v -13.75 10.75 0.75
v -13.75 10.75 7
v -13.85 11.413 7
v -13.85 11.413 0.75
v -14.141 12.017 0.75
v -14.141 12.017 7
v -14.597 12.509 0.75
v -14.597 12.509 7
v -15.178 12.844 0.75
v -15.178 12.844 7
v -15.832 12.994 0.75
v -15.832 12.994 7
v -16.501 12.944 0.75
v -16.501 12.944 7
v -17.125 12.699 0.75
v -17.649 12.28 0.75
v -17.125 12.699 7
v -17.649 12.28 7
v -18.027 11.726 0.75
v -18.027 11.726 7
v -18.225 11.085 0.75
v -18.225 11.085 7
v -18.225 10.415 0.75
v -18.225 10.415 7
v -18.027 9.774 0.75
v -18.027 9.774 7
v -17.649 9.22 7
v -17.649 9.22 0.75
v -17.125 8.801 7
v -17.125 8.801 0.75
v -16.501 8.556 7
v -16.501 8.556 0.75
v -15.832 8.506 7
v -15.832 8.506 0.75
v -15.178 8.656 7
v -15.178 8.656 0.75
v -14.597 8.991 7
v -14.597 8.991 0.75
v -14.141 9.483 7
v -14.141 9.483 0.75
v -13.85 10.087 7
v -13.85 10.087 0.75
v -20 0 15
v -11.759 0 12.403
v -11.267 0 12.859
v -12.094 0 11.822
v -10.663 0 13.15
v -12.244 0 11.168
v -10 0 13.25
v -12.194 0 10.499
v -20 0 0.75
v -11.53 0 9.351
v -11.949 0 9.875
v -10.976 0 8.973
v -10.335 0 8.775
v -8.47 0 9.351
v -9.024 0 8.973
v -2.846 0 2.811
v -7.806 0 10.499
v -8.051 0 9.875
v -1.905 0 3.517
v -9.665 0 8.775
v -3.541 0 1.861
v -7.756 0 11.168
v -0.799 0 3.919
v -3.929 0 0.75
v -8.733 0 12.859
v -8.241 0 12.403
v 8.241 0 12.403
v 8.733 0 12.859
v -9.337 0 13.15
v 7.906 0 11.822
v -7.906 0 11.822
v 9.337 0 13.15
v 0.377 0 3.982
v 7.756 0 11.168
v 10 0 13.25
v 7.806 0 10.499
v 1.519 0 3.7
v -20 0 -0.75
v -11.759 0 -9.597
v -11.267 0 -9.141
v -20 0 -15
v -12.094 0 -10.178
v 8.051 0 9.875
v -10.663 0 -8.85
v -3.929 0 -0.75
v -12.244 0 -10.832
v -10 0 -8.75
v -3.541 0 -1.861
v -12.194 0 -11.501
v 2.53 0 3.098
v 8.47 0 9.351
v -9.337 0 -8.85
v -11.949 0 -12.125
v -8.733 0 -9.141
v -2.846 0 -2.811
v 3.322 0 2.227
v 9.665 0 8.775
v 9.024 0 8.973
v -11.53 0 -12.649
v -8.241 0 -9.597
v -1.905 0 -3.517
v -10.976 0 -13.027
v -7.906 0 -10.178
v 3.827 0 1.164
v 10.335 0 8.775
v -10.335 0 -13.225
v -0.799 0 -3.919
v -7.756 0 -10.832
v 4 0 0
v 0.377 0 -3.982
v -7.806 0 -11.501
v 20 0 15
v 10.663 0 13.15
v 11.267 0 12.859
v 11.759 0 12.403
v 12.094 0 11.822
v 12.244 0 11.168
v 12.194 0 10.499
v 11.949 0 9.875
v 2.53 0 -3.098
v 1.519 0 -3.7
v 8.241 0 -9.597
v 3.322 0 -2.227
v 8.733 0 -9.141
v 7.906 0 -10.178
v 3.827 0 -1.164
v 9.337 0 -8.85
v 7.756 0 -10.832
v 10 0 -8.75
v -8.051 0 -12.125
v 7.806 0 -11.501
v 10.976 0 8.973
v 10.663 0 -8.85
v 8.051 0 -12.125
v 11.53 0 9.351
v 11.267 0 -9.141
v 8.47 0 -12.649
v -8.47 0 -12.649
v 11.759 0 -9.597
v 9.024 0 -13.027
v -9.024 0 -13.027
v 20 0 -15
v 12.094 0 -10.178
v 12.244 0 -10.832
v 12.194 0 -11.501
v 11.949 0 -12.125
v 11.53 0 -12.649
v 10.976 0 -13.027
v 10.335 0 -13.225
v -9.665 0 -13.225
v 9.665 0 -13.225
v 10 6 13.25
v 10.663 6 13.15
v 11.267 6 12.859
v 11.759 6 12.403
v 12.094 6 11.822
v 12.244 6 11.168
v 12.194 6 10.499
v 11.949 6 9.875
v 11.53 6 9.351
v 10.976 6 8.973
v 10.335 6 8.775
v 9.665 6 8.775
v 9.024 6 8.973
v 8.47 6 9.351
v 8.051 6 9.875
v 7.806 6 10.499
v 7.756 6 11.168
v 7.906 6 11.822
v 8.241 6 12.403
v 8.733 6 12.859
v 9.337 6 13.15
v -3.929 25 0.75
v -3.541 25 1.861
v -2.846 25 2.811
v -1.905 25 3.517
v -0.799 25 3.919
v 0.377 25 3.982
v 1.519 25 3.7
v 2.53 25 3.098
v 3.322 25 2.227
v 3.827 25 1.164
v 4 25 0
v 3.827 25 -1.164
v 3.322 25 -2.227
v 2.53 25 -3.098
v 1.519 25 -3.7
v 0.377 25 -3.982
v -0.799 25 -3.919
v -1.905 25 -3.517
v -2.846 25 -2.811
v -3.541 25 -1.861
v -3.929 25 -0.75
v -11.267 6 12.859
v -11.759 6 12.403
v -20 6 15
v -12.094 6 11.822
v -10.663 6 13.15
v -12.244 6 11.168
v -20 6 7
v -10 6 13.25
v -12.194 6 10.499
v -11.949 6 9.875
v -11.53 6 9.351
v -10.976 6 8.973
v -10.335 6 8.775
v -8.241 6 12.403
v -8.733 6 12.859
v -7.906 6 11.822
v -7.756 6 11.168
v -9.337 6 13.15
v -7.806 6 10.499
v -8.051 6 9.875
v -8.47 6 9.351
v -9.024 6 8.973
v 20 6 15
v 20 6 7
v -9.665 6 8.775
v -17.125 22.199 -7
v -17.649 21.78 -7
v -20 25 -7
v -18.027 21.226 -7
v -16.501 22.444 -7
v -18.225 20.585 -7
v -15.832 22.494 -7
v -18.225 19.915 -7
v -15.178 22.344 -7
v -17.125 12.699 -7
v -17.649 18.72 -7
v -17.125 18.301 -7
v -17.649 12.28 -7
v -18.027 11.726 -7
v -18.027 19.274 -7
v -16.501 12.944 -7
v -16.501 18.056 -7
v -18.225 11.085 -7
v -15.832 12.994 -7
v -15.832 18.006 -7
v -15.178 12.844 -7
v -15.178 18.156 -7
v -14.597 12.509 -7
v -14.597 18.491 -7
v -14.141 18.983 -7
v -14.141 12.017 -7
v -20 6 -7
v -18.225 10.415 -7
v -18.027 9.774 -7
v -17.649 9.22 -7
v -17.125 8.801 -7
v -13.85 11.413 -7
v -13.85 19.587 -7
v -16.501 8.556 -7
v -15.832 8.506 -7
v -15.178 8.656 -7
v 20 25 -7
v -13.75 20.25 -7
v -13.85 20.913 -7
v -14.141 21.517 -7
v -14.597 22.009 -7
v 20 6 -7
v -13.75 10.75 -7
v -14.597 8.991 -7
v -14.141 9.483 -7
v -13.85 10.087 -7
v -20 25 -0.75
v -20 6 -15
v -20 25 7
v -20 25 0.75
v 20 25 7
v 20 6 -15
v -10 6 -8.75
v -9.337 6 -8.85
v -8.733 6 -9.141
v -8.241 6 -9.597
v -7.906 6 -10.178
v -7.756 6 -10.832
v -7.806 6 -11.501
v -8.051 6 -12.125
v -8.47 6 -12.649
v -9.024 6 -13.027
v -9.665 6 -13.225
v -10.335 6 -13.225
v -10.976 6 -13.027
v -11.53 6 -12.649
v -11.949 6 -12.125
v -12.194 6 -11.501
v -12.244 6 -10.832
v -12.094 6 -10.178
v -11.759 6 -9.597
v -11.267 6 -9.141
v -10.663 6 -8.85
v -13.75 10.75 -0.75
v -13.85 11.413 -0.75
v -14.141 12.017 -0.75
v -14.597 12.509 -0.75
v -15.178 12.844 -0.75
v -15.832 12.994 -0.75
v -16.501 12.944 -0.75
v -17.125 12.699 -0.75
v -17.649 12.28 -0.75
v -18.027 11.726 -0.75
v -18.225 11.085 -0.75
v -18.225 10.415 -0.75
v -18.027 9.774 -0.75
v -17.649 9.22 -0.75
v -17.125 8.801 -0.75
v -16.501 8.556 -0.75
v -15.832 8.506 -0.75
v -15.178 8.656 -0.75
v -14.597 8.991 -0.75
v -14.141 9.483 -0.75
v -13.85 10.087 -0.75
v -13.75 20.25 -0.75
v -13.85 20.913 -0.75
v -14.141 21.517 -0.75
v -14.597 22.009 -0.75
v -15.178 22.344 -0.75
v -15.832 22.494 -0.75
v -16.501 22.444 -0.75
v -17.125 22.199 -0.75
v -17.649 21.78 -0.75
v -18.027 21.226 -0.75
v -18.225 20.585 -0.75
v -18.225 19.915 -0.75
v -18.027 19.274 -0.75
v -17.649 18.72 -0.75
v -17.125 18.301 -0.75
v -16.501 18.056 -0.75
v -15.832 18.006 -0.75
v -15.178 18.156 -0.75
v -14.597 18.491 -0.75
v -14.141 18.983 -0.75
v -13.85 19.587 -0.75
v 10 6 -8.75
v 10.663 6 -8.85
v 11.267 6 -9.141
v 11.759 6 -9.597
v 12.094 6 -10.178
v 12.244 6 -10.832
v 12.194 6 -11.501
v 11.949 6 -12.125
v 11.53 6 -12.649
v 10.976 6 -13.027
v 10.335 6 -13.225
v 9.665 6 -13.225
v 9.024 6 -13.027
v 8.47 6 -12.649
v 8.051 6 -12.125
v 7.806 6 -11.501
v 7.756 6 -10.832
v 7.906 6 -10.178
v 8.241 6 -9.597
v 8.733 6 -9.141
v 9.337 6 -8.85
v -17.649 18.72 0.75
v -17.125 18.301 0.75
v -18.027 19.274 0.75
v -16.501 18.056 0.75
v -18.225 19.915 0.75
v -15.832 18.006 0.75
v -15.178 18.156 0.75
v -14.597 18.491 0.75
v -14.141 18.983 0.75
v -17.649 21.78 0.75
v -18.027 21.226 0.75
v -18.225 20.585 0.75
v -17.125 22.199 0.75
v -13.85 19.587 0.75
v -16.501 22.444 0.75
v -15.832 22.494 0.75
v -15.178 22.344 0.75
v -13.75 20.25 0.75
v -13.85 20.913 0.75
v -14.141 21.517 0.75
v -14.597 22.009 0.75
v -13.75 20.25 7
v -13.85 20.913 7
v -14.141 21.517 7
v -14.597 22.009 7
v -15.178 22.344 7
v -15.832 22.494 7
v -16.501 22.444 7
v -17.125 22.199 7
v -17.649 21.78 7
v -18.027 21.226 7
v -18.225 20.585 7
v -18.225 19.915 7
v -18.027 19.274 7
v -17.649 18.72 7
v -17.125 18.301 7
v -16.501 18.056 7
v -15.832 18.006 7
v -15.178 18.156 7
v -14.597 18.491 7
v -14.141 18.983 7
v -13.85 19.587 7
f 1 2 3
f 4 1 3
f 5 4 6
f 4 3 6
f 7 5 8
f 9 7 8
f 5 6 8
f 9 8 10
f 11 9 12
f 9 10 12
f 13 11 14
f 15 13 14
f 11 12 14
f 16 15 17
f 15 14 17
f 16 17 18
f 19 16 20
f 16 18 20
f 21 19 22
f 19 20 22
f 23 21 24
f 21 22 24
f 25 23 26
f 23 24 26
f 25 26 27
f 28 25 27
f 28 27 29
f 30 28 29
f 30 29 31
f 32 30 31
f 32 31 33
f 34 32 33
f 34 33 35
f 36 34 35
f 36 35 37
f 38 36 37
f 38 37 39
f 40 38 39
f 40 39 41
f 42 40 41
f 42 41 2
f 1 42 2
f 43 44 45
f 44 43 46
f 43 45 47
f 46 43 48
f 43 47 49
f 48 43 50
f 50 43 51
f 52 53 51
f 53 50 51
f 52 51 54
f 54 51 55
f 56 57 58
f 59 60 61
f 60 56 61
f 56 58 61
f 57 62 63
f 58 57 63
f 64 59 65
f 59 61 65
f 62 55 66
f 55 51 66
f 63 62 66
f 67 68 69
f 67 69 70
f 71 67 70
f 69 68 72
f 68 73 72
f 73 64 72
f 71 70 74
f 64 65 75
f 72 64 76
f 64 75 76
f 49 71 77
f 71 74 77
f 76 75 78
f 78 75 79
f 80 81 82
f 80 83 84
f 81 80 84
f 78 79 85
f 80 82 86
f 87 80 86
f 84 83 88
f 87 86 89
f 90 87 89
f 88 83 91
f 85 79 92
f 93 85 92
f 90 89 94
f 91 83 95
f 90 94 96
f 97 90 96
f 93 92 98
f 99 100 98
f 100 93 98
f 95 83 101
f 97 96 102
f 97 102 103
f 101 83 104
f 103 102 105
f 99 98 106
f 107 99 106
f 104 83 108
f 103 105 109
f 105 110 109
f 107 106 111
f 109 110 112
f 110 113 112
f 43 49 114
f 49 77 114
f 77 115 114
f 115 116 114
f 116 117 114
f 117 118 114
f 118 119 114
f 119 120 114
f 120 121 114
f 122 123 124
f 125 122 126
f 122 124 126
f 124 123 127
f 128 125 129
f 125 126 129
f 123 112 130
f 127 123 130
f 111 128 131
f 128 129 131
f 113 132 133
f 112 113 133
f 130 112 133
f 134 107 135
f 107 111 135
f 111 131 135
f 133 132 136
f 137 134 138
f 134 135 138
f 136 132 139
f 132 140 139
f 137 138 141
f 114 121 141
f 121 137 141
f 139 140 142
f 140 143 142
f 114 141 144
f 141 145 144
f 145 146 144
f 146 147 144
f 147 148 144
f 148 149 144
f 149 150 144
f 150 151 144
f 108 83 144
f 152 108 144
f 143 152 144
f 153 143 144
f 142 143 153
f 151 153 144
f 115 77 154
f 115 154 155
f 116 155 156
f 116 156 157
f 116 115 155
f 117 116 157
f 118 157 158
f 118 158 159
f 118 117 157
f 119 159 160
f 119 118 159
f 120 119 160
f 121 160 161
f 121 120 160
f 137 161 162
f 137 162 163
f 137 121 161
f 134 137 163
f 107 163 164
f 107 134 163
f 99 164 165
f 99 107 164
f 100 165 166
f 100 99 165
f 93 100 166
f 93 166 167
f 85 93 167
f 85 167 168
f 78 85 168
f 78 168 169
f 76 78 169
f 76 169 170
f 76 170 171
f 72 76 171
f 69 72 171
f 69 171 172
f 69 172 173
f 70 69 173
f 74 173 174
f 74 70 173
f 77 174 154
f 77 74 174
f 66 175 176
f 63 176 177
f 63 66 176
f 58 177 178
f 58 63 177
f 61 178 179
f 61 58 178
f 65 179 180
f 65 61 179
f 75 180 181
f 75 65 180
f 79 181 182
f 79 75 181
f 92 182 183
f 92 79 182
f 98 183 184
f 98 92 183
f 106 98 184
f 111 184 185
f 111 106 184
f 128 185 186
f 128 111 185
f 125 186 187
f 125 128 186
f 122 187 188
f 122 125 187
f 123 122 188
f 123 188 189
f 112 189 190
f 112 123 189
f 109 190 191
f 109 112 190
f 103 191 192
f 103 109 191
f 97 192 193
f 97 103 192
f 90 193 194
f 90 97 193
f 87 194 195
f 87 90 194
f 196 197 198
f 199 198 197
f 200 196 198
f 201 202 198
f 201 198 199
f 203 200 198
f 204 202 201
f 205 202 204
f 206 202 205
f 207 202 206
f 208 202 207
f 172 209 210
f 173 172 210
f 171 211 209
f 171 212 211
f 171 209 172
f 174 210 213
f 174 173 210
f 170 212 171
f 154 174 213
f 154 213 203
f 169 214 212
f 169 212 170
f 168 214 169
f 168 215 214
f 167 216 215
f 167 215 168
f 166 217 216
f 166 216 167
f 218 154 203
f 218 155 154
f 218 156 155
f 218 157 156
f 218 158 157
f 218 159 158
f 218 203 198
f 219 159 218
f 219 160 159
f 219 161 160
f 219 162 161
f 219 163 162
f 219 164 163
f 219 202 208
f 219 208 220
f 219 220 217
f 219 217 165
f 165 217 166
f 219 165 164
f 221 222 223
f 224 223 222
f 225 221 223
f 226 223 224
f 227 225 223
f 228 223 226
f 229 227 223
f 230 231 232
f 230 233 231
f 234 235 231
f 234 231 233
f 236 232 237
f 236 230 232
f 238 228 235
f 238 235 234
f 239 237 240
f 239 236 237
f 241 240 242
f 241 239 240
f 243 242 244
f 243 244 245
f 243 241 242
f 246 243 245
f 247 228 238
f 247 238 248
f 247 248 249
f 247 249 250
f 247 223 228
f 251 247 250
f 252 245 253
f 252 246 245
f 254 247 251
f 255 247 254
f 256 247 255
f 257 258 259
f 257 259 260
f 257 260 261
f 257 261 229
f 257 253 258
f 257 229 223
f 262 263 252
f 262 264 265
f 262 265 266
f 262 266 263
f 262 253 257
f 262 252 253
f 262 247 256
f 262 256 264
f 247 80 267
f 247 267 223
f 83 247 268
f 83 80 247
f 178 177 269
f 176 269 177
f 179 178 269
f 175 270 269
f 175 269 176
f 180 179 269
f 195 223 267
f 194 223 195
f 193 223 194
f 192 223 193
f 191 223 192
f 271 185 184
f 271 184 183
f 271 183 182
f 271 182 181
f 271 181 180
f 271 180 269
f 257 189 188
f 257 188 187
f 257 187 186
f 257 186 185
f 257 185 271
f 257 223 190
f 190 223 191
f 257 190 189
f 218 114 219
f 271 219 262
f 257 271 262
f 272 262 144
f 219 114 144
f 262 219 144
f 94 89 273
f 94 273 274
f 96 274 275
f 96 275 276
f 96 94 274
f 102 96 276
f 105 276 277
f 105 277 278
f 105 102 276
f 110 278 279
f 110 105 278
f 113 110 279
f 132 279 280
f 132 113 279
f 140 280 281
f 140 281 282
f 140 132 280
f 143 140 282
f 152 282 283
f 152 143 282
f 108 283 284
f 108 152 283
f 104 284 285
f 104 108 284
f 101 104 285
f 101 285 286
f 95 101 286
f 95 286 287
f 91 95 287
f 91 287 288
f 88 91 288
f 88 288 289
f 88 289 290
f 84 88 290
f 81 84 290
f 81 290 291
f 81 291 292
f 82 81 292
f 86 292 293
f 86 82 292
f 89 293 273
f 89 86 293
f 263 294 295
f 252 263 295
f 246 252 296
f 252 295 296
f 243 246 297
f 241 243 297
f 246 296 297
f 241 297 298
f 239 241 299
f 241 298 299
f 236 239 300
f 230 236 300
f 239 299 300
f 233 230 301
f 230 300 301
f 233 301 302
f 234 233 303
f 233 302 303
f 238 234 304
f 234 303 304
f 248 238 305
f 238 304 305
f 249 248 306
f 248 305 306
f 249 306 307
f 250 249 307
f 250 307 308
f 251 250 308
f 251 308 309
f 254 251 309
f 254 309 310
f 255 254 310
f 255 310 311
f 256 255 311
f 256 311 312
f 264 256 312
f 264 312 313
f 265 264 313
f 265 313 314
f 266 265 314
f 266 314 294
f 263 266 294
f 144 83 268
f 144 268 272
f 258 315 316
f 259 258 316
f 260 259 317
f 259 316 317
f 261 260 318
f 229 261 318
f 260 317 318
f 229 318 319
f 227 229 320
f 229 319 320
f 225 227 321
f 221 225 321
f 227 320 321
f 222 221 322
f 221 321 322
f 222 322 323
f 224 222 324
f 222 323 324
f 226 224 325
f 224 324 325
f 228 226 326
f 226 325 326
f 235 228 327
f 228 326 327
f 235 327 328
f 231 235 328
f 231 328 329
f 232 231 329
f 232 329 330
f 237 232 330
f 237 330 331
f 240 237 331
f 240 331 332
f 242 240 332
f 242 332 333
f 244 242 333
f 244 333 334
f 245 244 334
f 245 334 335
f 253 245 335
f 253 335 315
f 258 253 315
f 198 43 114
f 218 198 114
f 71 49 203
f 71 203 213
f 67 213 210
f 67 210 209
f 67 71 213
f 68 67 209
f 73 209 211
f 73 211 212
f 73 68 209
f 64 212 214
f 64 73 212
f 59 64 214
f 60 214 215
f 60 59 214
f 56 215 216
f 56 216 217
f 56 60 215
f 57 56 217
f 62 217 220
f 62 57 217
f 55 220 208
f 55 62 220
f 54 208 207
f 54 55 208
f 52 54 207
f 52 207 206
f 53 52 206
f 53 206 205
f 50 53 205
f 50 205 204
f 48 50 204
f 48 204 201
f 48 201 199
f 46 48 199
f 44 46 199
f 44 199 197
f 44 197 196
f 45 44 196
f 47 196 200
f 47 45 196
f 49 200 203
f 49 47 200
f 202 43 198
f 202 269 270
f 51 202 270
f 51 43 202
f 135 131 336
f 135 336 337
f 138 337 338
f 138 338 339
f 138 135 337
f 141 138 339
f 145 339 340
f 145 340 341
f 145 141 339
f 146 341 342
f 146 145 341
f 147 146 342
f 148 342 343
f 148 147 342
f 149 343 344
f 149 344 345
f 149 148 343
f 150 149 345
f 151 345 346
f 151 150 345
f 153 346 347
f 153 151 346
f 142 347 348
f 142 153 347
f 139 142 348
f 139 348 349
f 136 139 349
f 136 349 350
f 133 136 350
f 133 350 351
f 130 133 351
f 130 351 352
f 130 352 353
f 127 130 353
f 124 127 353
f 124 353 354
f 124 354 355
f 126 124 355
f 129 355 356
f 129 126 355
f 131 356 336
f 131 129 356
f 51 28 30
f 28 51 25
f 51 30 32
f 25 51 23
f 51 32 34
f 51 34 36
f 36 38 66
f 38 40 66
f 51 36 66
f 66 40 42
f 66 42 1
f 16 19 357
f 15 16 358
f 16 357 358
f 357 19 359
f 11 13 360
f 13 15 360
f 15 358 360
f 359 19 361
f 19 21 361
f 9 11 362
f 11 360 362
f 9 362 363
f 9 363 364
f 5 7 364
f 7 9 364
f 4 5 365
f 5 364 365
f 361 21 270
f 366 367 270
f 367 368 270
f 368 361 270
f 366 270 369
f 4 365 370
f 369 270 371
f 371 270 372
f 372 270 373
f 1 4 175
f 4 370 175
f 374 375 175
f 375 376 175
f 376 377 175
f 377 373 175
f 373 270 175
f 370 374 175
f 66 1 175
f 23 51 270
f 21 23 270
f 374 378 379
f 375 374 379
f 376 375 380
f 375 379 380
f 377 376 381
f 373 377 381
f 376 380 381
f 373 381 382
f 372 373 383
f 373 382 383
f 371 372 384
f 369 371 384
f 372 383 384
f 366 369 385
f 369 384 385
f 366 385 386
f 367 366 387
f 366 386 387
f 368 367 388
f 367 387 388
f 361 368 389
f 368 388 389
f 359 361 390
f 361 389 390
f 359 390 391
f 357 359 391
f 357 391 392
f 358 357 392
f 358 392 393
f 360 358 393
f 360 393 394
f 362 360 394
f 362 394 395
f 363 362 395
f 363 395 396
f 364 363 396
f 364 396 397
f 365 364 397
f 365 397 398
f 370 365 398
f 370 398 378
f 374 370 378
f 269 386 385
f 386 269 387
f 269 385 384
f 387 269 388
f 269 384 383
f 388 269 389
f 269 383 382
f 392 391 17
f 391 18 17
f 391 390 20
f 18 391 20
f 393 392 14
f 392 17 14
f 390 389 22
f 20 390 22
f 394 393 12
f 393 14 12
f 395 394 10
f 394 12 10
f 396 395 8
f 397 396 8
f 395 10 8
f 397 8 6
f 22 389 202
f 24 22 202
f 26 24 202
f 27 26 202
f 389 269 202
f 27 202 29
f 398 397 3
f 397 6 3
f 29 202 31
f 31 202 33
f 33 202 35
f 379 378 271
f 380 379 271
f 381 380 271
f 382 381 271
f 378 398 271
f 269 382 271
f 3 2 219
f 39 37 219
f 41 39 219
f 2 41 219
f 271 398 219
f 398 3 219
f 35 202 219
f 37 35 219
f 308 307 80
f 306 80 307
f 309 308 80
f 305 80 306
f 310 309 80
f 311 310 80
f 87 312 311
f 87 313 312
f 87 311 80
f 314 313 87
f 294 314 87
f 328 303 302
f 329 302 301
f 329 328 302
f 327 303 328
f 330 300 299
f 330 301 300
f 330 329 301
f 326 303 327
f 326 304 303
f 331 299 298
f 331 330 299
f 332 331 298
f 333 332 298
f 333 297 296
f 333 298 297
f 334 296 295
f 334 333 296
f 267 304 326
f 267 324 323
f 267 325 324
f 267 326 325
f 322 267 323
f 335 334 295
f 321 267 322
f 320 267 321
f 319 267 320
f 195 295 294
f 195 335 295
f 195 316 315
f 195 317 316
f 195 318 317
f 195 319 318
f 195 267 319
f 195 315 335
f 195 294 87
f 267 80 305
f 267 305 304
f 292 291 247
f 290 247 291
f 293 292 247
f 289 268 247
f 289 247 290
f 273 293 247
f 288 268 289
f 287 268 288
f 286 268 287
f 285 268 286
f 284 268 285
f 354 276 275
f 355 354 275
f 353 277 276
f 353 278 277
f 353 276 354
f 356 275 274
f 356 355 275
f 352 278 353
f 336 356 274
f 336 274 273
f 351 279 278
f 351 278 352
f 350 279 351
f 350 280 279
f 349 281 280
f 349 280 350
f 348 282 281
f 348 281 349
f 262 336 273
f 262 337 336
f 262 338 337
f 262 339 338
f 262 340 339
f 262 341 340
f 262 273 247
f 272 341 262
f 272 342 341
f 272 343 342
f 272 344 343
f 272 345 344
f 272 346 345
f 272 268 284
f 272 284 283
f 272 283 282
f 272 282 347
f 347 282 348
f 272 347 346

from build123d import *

# Parameters (mm, degrees)
SKETCH2_W               = 40
SKETCH2_H               = 14
SKETCH2_R               = 4
BOSS_EXTRUDE_WALL_DEPTH = 25
SKETCH2_3_W             = 40
SKETCH2_3_H             = 8
SKETCH2_3_R             = 2.25
BOSS_EXTRUDE2_DEPTH     = 6
SKETCH3_W               = 20
SKETCH3_H               = 1.5
CUT_EXTRUDE1_DEPTH      = 36.355339059
SKETCH4_R               = 2.25
CUT_EXTRUDE2_DEPTH      = 39.845849199


with BuildPart() as part:
    # Sketch2 → Boss-Extrude_wall (new body)
    with BuildSketch(Plane(origin=(0, 0, 0), x_dir=(1, 0, 0), z_dir=(0, 1, 0))):
        Rectangle(SKETCH2_W, SKETCH2_H)
        Circle(SKETCH2_R, mode=Mode.SUBTRACT)
    extrude(amount=BOSS_EXTRUDE_WALL_DEPTH)

    # Sketch2<3> → Boss-Extrude2 (add)
    # profile 1 of 2: a face of its own
    with BuildSketch(Plane(origin=(0, 0, 0), x_dir=(1, 0, 0), z_dir=(0, 1, 0))):
        with Locations((0, 11)):
            Rectangle(SKETCH2_3_W, SKETCH2_3_H)
        with Locations((-10, 11)):
            Circle(SKETCH2_3_R, mode=Mode.SUBTRACT)
        with Locations((10, 11)):
            Circle(SKETCH2_3_R, mode=Mode.SUBTRACT)
    # profile 2 of 2: a face of its own
    with BuildSketch(Plane(origin=(0, 0, 0), x_dir=(1, 0, 0), z_dir=(0, 1, 0))):
        with Locations((0, -11)):
            Rectangle(SKETCH2_3_W, SKETCH2_3_H)
        with Locations((-10, -11)):
            Circle(SKETCH2_3_R, mode=Mode.SUBTRACT)
        with Locations((10, -11)):
            Circle(SKETCH2_3_R, mode=Mode.SUBTRACT)
    extrude(amount=BOSS_EXTRUDE2_DEPTH)

    # Sketch3 → Cut-Extrude1 (cut, through all)
    with BuildSketch(Plane(origin=(0, 25, 0), x_dir=(1, 0, 0), z_dir=(0, 1, 0))):
        with Locations((-10, 0)):
            Rectangle(SKETCH3_W, SKETCH3_H)
    extrude(amount=-CUT_EXTRUDE1_DEPTH, mode=Mode.SUBTRACT)

    # Sketch4 → Cut-Extrude2 (cut, through all)
    with BuildSketch(Plane.XY.offset(7)):
        with Locations((-16, 20.25)):
            Circle(SKETCH4_R)
        with Locations((-16, 10.75)):
            Circle(SKETCH4_R)
    extrude(amount=-CUT_EXTRUDE2_DEPTH, mode=Mode.SUBTRACT)


solid = part.part
